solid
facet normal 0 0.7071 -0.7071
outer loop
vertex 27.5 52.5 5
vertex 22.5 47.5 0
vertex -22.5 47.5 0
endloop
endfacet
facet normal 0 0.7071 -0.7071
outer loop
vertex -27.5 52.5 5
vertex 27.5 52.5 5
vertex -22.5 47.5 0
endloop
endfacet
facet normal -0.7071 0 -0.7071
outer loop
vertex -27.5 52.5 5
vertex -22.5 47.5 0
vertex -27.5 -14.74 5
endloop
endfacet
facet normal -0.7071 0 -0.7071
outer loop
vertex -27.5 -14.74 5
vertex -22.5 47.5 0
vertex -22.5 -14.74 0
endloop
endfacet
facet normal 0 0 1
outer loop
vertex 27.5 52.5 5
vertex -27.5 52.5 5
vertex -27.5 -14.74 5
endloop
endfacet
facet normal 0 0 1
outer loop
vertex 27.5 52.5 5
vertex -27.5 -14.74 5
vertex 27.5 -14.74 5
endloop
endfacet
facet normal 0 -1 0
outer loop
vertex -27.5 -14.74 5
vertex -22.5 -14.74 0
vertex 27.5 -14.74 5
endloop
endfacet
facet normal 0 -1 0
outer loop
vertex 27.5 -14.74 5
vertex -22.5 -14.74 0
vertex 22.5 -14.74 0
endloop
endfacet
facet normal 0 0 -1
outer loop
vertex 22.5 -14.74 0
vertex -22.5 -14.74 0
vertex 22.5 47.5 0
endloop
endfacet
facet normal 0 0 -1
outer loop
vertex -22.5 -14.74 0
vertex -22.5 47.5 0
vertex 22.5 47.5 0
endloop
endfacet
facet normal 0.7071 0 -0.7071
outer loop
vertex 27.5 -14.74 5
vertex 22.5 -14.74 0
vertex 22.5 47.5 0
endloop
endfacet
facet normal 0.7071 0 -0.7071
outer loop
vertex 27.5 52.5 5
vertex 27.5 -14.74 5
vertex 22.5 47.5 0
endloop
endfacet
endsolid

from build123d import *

# Parameters (mm, degrees)
F1_DEPTH = 5
F2_SIZE  = 4.99999


# Not quite as in the source:
# - a fillet or chamfer is up to 0.001 mm smaller than in the source, because OpenCascade refuses the exact size


with BuildPart() as f1:
    # F0 (on Top) → F1 (new body)
    with BuildSketch(Plane.XY):
        Polygon((-27.5, -11.5), (27.5, -14.74), (27.5, 52.5), (-27.5, 52.5), align=None)
        Polygon((-27.5, -14.74), (27.5, -14.74), (-27.5, -11.5), align=None)
    extrude(amount=F1_DEPTH)

    # F2 (size 5 in the source; OpenCascade refuses exactly that, so slightly less here)
    f2_edges = [f1.edges().sort_by_distance(p)[0] for p in [
        (27.5, 18.88, 0),
        (0, 52.5, 0),
        (-27.5, 18.88, 0),
    ]]
    chamfer(f2_edges, length=F2_SIZE)


solid = f1.part
